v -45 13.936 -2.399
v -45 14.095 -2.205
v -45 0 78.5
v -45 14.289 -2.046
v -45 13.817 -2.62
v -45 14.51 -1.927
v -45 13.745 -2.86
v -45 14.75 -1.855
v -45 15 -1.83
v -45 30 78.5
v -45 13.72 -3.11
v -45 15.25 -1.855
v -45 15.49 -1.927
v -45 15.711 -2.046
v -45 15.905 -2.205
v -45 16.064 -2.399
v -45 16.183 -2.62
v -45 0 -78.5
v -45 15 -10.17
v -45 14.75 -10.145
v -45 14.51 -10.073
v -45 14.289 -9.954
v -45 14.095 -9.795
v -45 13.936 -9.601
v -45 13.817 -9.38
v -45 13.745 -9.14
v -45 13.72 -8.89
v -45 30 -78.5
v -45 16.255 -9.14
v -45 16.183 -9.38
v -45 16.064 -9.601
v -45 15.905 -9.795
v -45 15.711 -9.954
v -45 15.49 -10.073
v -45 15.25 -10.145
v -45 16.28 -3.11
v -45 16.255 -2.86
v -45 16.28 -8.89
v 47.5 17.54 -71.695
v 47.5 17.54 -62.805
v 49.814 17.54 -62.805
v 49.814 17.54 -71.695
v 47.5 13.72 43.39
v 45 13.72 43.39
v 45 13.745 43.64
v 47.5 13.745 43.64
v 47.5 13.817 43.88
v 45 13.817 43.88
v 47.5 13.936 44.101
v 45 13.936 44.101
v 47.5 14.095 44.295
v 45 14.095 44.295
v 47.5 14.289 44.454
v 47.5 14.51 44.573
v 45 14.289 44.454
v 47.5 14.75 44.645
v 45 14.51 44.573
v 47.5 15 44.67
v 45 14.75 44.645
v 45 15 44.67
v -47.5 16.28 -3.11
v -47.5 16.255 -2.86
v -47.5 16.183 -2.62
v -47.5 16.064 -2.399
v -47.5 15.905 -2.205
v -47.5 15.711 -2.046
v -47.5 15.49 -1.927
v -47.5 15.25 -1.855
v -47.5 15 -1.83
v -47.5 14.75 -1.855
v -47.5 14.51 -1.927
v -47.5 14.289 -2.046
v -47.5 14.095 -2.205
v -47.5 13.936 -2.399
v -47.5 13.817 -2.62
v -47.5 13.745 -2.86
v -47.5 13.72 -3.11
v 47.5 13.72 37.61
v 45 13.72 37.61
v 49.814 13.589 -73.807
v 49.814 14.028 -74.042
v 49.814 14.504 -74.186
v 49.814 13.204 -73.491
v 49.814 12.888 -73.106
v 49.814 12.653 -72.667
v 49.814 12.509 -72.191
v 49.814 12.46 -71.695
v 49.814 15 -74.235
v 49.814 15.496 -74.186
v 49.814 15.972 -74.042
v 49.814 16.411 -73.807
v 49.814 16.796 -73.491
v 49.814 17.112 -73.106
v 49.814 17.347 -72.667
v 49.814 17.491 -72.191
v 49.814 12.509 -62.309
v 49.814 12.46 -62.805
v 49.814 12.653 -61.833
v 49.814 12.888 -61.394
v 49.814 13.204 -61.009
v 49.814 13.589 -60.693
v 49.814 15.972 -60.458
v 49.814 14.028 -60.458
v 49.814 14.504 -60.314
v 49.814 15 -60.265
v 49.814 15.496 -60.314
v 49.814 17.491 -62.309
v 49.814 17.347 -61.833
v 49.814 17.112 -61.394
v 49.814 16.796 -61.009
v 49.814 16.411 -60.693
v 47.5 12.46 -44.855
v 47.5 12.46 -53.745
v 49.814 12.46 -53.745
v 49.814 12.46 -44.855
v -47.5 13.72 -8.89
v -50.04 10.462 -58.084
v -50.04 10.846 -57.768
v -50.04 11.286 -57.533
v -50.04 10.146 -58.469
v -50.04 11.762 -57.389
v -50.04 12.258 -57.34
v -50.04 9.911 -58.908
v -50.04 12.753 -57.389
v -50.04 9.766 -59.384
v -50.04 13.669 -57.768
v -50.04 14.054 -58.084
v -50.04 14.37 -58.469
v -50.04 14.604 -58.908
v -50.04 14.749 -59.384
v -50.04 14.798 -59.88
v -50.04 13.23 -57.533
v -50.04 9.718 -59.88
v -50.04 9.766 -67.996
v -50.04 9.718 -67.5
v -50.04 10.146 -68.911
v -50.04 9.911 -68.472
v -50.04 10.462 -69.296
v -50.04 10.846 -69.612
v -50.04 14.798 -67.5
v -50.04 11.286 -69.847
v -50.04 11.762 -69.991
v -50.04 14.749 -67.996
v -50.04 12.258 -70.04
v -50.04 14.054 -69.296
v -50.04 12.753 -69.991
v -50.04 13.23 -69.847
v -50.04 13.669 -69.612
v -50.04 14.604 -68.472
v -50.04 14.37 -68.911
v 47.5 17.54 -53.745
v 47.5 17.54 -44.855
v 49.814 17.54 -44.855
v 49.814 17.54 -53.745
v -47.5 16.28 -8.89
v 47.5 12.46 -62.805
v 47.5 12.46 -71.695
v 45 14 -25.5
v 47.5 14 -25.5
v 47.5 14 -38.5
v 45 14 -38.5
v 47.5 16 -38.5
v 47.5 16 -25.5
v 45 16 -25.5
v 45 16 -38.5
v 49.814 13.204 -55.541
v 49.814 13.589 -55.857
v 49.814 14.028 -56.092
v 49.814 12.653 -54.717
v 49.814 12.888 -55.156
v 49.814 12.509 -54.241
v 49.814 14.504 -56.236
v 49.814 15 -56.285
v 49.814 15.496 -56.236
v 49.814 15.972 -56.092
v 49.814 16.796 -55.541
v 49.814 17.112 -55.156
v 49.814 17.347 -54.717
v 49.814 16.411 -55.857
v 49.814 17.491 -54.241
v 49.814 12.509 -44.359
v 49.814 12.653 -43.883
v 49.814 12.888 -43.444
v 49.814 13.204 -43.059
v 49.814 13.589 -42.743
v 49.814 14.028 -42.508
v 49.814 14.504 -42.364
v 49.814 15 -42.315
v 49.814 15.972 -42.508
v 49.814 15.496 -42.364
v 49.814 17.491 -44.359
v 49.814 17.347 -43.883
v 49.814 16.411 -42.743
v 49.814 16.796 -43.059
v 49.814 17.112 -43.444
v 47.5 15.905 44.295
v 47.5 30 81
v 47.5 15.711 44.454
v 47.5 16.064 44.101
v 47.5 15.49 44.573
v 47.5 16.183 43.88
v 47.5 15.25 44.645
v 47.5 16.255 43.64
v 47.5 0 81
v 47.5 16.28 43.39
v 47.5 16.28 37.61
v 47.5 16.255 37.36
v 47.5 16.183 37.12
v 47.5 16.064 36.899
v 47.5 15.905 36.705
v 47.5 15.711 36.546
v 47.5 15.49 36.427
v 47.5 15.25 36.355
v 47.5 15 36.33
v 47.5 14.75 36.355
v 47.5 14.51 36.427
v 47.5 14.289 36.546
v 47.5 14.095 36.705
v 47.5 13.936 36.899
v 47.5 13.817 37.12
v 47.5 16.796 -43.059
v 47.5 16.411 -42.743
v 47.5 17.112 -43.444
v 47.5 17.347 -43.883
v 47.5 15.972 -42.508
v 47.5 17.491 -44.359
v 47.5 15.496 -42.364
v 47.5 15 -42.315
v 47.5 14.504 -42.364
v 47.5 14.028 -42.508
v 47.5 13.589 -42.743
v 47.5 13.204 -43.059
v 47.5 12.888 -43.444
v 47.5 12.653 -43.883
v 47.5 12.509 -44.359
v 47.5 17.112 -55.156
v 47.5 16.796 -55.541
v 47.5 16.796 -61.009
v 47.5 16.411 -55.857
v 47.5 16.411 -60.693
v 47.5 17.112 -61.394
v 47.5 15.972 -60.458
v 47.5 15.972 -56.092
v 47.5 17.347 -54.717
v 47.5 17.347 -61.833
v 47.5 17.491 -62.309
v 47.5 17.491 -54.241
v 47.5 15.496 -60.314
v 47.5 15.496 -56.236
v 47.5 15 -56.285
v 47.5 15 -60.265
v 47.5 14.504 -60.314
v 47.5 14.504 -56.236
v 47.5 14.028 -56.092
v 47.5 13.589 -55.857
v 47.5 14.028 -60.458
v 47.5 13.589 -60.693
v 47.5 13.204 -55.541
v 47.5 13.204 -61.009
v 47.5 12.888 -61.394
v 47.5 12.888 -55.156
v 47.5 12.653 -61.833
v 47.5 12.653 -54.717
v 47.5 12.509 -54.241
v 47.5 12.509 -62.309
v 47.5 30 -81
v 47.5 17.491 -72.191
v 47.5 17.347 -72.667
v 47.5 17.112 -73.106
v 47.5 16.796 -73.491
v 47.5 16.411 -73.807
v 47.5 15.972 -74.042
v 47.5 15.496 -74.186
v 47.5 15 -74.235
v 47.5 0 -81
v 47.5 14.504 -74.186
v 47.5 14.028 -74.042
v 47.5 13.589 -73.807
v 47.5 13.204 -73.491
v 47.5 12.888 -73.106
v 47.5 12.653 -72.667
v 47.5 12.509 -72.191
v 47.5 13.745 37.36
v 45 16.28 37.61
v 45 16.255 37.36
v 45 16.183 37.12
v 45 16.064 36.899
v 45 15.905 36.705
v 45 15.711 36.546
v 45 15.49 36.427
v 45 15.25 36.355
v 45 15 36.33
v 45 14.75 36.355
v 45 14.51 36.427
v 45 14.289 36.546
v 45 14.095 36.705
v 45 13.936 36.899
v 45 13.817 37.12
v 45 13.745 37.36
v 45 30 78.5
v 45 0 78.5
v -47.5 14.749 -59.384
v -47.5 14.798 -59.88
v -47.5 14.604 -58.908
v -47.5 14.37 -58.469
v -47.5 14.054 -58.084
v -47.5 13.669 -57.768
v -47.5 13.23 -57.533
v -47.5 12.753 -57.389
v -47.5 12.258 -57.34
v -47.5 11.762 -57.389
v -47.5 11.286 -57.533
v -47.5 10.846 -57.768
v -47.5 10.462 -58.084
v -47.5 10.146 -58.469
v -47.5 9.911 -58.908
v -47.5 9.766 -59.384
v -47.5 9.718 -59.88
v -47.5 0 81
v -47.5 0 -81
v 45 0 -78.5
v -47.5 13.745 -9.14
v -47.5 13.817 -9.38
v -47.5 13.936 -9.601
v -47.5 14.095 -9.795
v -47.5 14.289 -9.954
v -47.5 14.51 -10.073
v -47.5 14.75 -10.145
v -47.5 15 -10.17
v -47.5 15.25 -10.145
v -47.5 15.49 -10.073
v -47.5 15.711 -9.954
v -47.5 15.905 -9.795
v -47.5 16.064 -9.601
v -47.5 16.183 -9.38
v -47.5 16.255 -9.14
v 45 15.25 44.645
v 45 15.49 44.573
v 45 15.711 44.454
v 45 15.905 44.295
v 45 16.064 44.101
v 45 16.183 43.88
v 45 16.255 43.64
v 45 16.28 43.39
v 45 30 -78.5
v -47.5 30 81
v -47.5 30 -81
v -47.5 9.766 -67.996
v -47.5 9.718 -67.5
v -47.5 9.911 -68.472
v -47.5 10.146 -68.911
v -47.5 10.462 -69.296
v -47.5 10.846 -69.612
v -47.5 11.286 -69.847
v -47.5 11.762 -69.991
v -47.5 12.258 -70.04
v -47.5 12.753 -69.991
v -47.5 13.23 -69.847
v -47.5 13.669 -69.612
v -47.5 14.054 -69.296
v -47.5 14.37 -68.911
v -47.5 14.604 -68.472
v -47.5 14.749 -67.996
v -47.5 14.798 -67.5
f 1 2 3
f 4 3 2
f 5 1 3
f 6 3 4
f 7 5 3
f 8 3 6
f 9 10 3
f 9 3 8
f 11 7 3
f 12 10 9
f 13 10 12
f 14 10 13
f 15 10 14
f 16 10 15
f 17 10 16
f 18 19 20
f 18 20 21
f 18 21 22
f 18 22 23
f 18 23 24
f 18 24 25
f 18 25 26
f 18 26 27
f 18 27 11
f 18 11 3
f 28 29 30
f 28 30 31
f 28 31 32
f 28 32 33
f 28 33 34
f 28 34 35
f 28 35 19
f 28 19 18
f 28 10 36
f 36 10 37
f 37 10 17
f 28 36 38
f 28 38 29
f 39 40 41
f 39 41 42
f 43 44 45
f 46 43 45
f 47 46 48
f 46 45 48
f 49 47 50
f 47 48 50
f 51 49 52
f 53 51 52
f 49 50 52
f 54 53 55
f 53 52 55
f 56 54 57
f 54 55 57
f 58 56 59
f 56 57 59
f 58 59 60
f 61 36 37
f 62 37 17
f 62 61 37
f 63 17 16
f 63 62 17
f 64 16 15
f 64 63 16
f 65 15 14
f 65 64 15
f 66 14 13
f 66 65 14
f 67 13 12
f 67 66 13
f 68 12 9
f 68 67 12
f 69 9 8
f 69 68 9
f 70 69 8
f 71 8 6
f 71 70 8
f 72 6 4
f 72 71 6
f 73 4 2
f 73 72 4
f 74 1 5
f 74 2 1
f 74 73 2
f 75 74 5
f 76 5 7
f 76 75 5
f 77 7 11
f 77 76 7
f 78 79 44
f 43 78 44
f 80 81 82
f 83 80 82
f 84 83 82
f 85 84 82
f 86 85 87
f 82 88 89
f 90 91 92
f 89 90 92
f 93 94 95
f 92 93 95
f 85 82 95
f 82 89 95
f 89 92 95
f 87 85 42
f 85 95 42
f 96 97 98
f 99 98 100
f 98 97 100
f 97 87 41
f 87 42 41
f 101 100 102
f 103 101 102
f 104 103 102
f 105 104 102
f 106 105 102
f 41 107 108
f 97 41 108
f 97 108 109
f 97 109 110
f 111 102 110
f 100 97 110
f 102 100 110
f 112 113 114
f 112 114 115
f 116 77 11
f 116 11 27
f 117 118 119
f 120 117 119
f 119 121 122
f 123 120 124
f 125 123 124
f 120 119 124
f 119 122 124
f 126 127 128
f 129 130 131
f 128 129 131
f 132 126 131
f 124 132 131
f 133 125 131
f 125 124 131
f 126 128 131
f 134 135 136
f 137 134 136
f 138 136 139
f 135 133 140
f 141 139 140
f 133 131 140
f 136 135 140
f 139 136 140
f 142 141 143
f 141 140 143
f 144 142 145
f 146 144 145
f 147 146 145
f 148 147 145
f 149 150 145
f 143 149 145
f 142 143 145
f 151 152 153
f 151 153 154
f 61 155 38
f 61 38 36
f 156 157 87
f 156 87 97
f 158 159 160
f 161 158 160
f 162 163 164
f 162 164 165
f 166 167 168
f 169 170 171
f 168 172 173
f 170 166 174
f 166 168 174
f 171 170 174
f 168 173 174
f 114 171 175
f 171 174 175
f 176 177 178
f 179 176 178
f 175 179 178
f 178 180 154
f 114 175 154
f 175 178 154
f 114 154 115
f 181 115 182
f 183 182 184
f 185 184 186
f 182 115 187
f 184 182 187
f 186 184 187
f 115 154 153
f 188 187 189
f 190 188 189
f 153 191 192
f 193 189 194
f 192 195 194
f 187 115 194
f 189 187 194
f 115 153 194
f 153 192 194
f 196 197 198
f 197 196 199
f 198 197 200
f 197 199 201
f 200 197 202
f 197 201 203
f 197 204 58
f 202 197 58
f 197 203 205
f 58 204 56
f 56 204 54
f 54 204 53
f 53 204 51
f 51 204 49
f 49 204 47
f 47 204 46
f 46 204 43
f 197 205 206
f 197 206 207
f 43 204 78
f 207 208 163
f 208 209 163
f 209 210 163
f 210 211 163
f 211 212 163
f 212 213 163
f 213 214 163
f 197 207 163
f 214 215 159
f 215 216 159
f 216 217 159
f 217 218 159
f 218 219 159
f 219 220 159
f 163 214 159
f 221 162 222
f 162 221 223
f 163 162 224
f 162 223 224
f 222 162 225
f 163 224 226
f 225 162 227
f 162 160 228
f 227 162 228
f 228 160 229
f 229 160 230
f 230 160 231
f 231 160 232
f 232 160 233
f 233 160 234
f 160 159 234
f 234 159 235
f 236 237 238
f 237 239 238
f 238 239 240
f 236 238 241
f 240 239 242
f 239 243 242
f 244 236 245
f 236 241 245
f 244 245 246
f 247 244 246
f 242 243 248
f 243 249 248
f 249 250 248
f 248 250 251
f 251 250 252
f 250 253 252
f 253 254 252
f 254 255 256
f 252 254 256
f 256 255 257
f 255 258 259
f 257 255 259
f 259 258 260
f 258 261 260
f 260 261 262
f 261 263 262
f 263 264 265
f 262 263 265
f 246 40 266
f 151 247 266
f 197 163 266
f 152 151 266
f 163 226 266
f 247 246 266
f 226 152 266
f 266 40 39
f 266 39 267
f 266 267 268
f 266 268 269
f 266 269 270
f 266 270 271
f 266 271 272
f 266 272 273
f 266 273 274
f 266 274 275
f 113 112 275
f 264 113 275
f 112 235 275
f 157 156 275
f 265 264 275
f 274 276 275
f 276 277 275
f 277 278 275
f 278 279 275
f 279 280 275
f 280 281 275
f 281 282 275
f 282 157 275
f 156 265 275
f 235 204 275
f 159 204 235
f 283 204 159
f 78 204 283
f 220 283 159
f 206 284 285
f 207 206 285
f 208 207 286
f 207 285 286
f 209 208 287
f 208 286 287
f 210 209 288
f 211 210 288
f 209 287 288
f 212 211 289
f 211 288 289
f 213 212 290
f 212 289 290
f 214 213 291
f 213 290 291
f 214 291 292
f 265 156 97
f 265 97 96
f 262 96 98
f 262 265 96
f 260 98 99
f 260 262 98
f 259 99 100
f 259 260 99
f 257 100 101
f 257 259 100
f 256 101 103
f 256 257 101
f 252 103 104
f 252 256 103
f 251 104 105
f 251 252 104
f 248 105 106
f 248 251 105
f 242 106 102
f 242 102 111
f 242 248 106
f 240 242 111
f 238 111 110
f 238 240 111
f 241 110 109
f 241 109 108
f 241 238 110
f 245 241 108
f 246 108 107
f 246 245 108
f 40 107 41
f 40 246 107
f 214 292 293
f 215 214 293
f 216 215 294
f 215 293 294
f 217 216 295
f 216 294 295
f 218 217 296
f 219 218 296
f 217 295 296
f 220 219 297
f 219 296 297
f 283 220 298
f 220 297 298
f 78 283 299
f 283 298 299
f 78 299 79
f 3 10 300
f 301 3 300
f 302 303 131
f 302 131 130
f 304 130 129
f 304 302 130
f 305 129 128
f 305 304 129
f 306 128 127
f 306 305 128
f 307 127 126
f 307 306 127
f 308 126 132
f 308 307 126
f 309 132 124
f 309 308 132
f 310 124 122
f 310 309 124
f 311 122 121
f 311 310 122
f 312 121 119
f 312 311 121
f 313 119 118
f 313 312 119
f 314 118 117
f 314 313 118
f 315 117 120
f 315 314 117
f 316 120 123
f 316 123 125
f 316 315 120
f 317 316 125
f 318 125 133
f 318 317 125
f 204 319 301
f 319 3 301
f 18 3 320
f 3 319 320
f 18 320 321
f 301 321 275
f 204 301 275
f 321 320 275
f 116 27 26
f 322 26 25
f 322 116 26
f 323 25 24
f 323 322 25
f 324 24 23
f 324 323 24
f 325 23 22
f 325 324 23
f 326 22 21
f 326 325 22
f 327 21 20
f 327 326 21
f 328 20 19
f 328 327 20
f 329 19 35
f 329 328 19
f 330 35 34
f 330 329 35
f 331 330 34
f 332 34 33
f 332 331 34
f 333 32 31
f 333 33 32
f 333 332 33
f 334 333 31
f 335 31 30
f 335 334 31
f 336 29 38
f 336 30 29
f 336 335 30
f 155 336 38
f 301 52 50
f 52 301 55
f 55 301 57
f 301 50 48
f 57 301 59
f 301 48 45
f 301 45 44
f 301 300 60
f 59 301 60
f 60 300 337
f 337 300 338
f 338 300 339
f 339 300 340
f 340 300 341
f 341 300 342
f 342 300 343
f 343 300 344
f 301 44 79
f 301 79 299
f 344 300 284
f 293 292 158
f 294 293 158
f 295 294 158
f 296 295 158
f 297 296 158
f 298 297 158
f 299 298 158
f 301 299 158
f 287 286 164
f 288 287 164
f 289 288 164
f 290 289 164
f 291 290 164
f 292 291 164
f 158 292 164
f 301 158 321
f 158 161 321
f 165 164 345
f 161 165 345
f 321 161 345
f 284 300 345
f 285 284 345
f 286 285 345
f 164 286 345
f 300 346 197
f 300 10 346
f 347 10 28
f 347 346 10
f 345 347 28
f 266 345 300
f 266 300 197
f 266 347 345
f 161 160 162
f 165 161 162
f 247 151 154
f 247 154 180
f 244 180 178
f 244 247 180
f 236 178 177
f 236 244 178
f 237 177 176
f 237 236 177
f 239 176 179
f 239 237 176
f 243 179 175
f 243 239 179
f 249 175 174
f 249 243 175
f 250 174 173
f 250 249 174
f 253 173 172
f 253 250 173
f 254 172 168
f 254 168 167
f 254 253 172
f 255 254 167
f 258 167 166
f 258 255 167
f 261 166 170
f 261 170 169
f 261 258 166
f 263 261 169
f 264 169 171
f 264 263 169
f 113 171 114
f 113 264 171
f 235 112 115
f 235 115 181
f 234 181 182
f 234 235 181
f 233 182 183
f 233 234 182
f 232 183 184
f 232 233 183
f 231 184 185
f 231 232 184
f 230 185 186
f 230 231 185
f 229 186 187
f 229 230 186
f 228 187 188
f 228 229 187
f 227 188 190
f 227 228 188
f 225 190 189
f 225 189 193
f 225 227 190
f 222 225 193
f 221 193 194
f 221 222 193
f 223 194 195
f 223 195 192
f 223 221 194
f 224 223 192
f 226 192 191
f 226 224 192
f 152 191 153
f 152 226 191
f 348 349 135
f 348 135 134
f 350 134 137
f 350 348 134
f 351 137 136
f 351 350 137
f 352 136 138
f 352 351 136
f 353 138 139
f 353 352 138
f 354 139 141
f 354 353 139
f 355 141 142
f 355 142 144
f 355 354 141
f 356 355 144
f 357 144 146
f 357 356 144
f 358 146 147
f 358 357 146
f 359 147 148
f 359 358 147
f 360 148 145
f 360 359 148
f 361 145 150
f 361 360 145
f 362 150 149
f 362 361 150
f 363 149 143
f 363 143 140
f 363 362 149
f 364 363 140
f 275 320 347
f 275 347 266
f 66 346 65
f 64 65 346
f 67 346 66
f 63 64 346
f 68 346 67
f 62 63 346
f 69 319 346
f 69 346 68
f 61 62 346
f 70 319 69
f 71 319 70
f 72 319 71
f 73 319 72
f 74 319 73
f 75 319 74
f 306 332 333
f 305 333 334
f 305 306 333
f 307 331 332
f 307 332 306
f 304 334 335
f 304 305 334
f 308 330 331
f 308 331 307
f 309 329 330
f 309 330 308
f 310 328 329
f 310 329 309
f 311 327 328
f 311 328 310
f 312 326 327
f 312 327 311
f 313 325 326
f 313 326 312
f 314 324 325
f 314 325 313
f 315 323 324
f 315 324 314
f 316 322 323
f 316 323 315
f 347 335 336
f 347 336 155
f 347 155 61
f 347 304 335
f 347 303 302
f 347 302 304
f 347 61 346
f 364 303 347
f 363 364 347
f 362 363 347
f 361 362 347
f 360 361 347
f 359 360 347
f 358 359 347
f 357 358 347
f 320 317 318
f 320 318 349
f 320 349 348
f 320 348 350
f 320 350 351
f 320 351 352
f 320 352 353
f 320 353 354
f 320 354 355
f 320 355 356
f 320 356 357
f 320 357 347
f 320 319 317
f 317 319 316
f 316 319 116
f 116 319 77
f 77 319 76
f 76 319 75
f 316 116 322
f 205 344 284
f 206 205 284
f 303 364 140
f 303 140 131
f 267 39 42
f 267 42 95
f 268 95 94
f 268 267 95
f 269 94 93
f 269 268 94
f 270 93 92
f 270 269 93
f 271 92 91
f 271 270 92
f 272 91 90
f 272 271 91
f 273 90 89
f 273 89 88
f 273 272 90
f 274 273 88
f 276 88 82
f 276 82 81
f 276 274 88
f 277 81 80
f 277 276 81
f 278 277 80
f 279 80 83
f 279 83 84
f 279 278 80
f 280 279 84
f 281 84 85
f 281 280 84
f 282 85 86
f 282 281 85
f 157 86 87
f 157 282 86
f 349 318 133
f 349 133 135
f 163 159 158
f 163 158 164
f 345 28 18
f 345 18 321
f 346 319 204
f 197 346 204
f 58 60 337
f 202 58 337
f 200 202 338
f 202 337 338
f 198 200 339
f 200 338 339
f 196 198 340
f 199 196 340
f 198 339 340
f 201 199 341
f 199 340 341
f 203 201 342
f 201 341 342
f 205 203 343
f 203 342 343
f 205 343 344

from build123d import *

# Parameters (mm, degrees)
SKETCH1_W           = 94.999999992
SKETCH1_H           = 162.000000104
BOSS_EXTRUDE1_DEPTH = 30
SKETCH2_W           = 90.000000086
SKETCH2_H           = 156.999999944
CUT_EXTRUDE1_DEPTH  = 30
SKETCH3_W           = 13
SKETCH3_H           = 2
BOSS_EXTRUDE2_DEPTH = 2.314
SKETCH4_W           = 13
SKETCH4_H           = 2
CUT_EXTRUDE2_DEPTH  = 6.632
CUT_EXTRUDE3_START  = -6.632
CUT_EXTRUDE3_DEPTH  = 6.632
CUT_EXTRUDE4_DEPTH  = 6.632
BOSS_EXTRUDE3_DEPTH = 2.54


with BuildPart() as part:
    # Sketch1 → Boss-Extrude1 (new body)
    with BuildSketch(Plane(origin=(0, 0, 0), x_dir=(1, 0, 0), z_dir=(0, 1, 0))):
        Rectangle(SKETCH1_W, SKETCH1_H)
    extrude(amount=BOSS_EXTRUDE1_DEPTH)

    # Sketch2 → Cut-Extrude1 (cut)
    with BuildSketch(Plane(origin=(0, 30, 0), x_dir=(1, 0, 0), z_dir=(0, 1, 0))):
        Rectangle(SKETCH2_W, SKETCH2_H)
    extrude(amount=-CUT_EXTRUDE1_DEPTH, mode=Mode.SUBTRACT)

    # Sketch3 → Boss-Extrude2 (add)
    with BuildSketch(Plane(origin=(47.499999996, 0, 0), x_dir=(0, 0, -1), z_dir=(1, 0, 0))):
        with BuildLine():
            Line((71.695000052, 12.46), (62.805000052, 12.46))
            ThreePointArc((62.805000052, 12.46), (60.265000052, 15), (62.805000052, 17.54))
            Line((62.805000052, 17.54), (71.695000052, 17.54))
            ThreePointArc((71.695000052, 17.54), (74.235000052, 15), (71.695000052, 12.46))
        make_face()
        with BuildLine():
            Line((53.744999952, 12.46), (44.854999952, 12.46))
            ThreePointArc((44.854999952, 12.46), (42.314999952, 15), (44.854999952, 17.54))
            Line((44.854999952, 17.54), (53.744999952, 17.54))
            ThreePointArc((53.744999952, 17.54), (56.284999952, 15), (53.744999952, 12.46))
        make_face()
        with Locations((32.000000052, 15)):
            Rectangle(SKETCH3_W, SKETCH3_H)
        with BuildLine():
            Line((-37.609999928, 13.72000002), (-43.389999968, 13.72000002))
            ThreePointArc((-43.389999968, 13.72000002), (-44.669999948, 15), (-43.389999968, 16.27999998))
            Line((-43.389999968, 16.27999998), (-37.609999928, 16.27999998))
            ThreePointArc((-37.609999928, 16.27999998), (-36.329999948, 15), (-37.609999928, 13.72000002))
        make_face()
    extrude(amount=BOSS_EXTRUDE2_DEPTH)

    # Sketch4 → Cut-Extrude2 (cut)
    with BuildSketch(Plane(origin=(49.813999996, 0, 0), x_dir=(0, 0, -1), z_dir=(1, 0, 0))):
        with Locations((32.000000052, 15)):
            Rectangle(SKETCH4_W, SKETCH4_H)
    extrude(amount=-CUT_EXTRUDE2_DEPTH, mode=Mode.SUBTRACT)

    # Sketch5 → Cut-Extrude3 (cut)
    with BuildSketch(Plane(origin=(49.813999996, 0, 0), x_dir=(0, 0, -1), z_dir=(1, 0, 0)).offset(CUT_EXTRUDE3_START)):
        with BuildLine():
            Line((-43.389999968, 16.27999998), (-37.609999928, 16.27999998))
            ThreePointArc((-37.609999928, 16.27999998), (-36.704903262, 15.905096666), (-36.329999948, 15))
            ThreePointArc((-36.329999948, 15), (-36.704903262, 14.094903334), (-37.609999928, 13.72000002))
            Line((-37.609999928, 13.72000002), (-43.389999968, 13.72000002))
            ThreePointArc((-43.389999968, 13.72000002), (-44.295096634, 14.094903334), (-44.669999948, 15))
            ThreePointArc((-44.669999948, 15), (-44.295096634, 15.905096666), (-43.389999968, 16.27999998))
        make_face()
    extrude(amount=CUT_EXTRUDE3_DEPTH, mode=Mode.SUBTRACT)

    # Sketch6 → Cut-Extrude4 (cut)
    with BuildSketch(Plane.ZY.offset(47.499999996)):
        with BuildLine():
            Line((-8.890000094, 16.28), (-3.11000001, 16.28))
            ThreePointArc((-3.11000001, 16.28), (-1.83000001, 15), (-3.11000001, 13.72))
            Line((-3.11000001, 13.72), (-8.890000094, 13.72))
            ThreePointArc((-8.890000094, 13.72), (-10.170000094, 15), (-8.890000094, 16.28))
        make_face()
    extrude(amount=-CUT_EXTRUDE4_DEPTH, mode=Mode.SUBTRACT)

    # Sketch9 → Boss-Extrude3 (add)
    with BuildSketch(Plane.ZY.offset(47.499999996)):
        with BuildLine():
            Line((-59.880000052, 9.717636473), (-67.500000052, 9.717636473))
            ThreePointArc((-67.500000052, 9.717636473), (-70.040000052, 12.257636473), (-67.500000052, 14.797636473))
            Line((-67.500000052, 14.797636473), (-59.880000052, 14.797636473))
            ThreePointArc((-59.880000052, 14.797636473), (-57.340000052, 12.257636473), (-59.880000052, 9.717636473))
        make_face()
    extrude(amount=BOSS_EXTRUDE3_DEPTH)


solid = part.part
